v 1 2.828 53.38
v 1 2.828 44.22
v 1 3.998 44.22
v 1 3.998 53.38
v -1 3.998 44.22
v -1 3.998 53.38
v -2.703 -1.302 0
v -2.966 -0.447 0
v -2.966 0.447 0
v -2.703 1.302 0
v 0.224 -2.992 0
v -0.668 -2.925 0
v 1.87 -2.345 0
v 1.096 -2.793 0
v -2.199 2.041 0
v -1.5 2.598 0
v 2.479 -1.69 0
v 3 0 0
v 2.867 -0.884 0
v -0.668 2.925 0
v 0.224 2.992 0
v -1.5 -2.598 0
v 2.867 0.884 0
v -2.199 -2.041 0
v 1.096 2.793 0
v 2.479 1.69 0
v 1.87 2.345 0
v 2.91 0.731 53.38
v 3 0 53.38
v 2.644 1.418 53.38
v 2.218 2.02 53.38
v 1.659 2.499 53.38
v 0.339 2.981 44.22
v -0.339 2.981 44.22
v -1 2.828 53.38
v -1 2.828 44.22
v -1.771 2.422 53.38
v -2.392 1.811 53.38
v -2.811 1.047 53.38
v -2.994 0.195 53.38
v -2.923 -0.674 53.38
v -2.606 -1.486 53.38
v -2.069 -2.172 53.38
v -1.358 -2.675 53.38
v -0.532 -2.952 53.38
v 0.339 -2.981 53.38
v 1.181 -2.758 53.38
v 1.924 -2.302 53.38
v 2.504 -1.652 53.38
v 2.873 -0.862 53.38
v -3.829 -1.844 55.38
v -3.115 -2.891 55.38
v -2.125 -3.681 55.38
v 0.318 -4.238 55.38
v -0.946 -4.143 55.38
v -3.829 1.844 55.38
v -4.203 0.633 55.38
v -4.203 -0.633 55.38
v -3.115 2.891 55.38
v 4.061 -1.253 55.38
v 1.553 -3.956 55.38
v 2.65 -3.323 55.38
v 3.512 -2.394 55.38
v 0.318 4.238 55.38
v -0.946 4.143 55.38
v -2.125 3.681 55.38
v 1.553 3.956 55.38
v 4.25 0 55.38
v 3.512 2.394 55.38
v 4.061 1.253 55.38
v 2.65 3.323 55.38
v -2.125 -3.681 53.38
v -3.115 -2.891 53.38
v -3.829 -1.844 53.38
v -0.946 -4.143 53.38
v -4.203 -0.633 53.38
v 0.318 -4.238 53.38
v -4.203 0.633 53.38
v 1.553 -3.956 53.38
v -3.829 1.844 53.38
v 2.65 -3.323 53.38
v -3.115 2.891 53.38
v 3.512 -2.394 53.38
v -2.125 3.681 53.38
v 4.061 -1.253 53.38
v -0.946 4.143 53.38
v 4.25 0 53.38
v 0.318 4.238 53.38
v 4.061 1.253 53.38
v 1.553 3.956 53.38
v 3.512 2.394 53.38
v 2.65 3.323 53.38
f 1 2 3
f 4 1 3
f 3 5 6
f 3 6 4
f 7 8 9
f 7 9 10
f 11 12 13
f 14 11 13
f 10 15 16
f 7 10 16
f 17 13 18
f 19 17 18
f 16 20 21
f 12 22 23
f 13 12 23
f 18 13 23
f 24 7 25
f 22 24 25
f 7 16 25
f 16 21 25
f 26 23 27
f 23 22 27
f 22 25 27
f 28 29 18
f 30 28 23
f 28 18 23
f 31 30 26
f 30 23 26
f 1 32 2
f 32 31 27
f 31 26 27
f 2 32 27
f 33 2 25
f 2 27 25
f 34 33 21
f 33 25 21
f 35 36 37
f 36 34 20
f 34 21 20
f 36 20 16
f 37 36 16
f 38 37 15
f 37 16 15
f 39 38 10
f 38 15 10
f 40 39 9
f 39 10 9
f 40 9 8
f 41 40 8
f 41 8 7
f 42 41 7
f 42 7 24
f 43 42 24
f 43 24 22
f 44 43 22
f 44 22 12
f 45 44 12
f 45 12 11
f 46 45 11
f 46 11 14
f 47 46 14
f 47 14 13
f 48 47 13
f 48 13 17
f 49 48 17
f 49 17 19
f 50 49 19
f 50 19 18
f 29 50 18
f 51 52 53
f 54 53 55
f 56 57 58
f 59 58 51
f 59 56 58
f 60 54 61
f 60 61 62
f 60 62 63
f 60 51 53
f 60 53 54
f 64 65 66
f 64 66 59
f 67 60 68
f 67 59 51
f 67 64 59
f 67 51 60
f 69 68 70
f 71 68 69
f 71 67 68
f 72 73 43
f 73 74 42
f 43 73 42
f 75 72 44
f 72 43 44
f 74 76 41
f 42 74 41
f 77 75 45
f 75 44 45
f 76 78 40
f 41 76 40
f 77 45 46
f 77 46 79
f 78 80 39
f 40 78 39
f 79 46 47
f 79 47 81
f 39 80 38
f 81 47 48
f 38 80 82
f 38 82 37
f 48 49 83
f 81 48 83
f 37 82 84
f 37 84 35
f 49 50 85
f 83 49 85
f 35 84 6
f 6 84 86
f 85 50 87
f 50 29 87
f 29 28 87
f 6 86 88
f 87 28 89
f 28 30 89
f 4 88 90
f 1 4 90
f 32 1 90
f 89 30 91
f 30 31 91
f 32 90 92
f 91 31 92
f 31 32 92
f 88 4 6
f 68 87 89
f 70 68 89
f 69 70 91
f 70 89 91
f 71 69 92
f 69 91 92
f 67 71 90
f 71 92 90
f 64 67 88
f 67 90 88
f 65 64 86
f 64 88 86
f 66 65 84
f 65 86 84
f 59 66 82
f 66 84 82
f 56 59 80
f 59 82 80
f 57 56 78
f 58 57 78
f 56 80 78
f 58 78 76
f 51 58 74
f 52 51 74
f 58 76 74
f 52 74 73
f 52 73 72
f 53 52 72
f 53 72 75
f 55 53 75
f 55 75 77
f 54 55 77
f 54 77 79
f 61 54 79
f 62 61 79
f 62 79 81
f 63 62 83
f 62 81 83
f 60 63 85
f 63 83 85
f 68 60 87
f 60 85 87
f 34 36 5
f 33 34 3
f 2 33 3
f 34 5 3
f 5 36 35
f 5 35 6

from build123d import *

# Parameters (mm, degrees)
SKETCH1_R           = 3
BOSS_EXTRUDE1_DEPTH = 53.38
SKETCH2_W           = 2
SKETCH2_H           = 1.17
BOSS_EXTRUDE2_DEPTH = 9.16
SKETCH3_R           = 4.25
BOSS_EXTRUDE3_DEPTH = 2


with BuildPart() as part:
    # Sketch1 → Boss-Extrude1 (new body)
    with BuildSketch(Plane.XY):
        Circle(SKETCH1_R)
    extrude(amount=BOSS_EXTRUDE1_DEPTH)

    # Sketch2 → Boss-Extrude2 (add)
    with BuildSketch(Plane.XY.offset(53.38)):
        with Locations((0, 3.413427125)):
            Rectangle(SKETCH2_W, SKETCH2_H)
    extrude(amount=-BOSS_EXTRUDE2_DEPTH)

    # Sketch3 → Boss-Extrude3 (add)
    with BuildSketch(Plane.XY.offset(53.38)):
        Circle(SKETCH3_R)
    extrude(amount=BOSS_EXTRUDE3_DEPTH)


solid = part.part
